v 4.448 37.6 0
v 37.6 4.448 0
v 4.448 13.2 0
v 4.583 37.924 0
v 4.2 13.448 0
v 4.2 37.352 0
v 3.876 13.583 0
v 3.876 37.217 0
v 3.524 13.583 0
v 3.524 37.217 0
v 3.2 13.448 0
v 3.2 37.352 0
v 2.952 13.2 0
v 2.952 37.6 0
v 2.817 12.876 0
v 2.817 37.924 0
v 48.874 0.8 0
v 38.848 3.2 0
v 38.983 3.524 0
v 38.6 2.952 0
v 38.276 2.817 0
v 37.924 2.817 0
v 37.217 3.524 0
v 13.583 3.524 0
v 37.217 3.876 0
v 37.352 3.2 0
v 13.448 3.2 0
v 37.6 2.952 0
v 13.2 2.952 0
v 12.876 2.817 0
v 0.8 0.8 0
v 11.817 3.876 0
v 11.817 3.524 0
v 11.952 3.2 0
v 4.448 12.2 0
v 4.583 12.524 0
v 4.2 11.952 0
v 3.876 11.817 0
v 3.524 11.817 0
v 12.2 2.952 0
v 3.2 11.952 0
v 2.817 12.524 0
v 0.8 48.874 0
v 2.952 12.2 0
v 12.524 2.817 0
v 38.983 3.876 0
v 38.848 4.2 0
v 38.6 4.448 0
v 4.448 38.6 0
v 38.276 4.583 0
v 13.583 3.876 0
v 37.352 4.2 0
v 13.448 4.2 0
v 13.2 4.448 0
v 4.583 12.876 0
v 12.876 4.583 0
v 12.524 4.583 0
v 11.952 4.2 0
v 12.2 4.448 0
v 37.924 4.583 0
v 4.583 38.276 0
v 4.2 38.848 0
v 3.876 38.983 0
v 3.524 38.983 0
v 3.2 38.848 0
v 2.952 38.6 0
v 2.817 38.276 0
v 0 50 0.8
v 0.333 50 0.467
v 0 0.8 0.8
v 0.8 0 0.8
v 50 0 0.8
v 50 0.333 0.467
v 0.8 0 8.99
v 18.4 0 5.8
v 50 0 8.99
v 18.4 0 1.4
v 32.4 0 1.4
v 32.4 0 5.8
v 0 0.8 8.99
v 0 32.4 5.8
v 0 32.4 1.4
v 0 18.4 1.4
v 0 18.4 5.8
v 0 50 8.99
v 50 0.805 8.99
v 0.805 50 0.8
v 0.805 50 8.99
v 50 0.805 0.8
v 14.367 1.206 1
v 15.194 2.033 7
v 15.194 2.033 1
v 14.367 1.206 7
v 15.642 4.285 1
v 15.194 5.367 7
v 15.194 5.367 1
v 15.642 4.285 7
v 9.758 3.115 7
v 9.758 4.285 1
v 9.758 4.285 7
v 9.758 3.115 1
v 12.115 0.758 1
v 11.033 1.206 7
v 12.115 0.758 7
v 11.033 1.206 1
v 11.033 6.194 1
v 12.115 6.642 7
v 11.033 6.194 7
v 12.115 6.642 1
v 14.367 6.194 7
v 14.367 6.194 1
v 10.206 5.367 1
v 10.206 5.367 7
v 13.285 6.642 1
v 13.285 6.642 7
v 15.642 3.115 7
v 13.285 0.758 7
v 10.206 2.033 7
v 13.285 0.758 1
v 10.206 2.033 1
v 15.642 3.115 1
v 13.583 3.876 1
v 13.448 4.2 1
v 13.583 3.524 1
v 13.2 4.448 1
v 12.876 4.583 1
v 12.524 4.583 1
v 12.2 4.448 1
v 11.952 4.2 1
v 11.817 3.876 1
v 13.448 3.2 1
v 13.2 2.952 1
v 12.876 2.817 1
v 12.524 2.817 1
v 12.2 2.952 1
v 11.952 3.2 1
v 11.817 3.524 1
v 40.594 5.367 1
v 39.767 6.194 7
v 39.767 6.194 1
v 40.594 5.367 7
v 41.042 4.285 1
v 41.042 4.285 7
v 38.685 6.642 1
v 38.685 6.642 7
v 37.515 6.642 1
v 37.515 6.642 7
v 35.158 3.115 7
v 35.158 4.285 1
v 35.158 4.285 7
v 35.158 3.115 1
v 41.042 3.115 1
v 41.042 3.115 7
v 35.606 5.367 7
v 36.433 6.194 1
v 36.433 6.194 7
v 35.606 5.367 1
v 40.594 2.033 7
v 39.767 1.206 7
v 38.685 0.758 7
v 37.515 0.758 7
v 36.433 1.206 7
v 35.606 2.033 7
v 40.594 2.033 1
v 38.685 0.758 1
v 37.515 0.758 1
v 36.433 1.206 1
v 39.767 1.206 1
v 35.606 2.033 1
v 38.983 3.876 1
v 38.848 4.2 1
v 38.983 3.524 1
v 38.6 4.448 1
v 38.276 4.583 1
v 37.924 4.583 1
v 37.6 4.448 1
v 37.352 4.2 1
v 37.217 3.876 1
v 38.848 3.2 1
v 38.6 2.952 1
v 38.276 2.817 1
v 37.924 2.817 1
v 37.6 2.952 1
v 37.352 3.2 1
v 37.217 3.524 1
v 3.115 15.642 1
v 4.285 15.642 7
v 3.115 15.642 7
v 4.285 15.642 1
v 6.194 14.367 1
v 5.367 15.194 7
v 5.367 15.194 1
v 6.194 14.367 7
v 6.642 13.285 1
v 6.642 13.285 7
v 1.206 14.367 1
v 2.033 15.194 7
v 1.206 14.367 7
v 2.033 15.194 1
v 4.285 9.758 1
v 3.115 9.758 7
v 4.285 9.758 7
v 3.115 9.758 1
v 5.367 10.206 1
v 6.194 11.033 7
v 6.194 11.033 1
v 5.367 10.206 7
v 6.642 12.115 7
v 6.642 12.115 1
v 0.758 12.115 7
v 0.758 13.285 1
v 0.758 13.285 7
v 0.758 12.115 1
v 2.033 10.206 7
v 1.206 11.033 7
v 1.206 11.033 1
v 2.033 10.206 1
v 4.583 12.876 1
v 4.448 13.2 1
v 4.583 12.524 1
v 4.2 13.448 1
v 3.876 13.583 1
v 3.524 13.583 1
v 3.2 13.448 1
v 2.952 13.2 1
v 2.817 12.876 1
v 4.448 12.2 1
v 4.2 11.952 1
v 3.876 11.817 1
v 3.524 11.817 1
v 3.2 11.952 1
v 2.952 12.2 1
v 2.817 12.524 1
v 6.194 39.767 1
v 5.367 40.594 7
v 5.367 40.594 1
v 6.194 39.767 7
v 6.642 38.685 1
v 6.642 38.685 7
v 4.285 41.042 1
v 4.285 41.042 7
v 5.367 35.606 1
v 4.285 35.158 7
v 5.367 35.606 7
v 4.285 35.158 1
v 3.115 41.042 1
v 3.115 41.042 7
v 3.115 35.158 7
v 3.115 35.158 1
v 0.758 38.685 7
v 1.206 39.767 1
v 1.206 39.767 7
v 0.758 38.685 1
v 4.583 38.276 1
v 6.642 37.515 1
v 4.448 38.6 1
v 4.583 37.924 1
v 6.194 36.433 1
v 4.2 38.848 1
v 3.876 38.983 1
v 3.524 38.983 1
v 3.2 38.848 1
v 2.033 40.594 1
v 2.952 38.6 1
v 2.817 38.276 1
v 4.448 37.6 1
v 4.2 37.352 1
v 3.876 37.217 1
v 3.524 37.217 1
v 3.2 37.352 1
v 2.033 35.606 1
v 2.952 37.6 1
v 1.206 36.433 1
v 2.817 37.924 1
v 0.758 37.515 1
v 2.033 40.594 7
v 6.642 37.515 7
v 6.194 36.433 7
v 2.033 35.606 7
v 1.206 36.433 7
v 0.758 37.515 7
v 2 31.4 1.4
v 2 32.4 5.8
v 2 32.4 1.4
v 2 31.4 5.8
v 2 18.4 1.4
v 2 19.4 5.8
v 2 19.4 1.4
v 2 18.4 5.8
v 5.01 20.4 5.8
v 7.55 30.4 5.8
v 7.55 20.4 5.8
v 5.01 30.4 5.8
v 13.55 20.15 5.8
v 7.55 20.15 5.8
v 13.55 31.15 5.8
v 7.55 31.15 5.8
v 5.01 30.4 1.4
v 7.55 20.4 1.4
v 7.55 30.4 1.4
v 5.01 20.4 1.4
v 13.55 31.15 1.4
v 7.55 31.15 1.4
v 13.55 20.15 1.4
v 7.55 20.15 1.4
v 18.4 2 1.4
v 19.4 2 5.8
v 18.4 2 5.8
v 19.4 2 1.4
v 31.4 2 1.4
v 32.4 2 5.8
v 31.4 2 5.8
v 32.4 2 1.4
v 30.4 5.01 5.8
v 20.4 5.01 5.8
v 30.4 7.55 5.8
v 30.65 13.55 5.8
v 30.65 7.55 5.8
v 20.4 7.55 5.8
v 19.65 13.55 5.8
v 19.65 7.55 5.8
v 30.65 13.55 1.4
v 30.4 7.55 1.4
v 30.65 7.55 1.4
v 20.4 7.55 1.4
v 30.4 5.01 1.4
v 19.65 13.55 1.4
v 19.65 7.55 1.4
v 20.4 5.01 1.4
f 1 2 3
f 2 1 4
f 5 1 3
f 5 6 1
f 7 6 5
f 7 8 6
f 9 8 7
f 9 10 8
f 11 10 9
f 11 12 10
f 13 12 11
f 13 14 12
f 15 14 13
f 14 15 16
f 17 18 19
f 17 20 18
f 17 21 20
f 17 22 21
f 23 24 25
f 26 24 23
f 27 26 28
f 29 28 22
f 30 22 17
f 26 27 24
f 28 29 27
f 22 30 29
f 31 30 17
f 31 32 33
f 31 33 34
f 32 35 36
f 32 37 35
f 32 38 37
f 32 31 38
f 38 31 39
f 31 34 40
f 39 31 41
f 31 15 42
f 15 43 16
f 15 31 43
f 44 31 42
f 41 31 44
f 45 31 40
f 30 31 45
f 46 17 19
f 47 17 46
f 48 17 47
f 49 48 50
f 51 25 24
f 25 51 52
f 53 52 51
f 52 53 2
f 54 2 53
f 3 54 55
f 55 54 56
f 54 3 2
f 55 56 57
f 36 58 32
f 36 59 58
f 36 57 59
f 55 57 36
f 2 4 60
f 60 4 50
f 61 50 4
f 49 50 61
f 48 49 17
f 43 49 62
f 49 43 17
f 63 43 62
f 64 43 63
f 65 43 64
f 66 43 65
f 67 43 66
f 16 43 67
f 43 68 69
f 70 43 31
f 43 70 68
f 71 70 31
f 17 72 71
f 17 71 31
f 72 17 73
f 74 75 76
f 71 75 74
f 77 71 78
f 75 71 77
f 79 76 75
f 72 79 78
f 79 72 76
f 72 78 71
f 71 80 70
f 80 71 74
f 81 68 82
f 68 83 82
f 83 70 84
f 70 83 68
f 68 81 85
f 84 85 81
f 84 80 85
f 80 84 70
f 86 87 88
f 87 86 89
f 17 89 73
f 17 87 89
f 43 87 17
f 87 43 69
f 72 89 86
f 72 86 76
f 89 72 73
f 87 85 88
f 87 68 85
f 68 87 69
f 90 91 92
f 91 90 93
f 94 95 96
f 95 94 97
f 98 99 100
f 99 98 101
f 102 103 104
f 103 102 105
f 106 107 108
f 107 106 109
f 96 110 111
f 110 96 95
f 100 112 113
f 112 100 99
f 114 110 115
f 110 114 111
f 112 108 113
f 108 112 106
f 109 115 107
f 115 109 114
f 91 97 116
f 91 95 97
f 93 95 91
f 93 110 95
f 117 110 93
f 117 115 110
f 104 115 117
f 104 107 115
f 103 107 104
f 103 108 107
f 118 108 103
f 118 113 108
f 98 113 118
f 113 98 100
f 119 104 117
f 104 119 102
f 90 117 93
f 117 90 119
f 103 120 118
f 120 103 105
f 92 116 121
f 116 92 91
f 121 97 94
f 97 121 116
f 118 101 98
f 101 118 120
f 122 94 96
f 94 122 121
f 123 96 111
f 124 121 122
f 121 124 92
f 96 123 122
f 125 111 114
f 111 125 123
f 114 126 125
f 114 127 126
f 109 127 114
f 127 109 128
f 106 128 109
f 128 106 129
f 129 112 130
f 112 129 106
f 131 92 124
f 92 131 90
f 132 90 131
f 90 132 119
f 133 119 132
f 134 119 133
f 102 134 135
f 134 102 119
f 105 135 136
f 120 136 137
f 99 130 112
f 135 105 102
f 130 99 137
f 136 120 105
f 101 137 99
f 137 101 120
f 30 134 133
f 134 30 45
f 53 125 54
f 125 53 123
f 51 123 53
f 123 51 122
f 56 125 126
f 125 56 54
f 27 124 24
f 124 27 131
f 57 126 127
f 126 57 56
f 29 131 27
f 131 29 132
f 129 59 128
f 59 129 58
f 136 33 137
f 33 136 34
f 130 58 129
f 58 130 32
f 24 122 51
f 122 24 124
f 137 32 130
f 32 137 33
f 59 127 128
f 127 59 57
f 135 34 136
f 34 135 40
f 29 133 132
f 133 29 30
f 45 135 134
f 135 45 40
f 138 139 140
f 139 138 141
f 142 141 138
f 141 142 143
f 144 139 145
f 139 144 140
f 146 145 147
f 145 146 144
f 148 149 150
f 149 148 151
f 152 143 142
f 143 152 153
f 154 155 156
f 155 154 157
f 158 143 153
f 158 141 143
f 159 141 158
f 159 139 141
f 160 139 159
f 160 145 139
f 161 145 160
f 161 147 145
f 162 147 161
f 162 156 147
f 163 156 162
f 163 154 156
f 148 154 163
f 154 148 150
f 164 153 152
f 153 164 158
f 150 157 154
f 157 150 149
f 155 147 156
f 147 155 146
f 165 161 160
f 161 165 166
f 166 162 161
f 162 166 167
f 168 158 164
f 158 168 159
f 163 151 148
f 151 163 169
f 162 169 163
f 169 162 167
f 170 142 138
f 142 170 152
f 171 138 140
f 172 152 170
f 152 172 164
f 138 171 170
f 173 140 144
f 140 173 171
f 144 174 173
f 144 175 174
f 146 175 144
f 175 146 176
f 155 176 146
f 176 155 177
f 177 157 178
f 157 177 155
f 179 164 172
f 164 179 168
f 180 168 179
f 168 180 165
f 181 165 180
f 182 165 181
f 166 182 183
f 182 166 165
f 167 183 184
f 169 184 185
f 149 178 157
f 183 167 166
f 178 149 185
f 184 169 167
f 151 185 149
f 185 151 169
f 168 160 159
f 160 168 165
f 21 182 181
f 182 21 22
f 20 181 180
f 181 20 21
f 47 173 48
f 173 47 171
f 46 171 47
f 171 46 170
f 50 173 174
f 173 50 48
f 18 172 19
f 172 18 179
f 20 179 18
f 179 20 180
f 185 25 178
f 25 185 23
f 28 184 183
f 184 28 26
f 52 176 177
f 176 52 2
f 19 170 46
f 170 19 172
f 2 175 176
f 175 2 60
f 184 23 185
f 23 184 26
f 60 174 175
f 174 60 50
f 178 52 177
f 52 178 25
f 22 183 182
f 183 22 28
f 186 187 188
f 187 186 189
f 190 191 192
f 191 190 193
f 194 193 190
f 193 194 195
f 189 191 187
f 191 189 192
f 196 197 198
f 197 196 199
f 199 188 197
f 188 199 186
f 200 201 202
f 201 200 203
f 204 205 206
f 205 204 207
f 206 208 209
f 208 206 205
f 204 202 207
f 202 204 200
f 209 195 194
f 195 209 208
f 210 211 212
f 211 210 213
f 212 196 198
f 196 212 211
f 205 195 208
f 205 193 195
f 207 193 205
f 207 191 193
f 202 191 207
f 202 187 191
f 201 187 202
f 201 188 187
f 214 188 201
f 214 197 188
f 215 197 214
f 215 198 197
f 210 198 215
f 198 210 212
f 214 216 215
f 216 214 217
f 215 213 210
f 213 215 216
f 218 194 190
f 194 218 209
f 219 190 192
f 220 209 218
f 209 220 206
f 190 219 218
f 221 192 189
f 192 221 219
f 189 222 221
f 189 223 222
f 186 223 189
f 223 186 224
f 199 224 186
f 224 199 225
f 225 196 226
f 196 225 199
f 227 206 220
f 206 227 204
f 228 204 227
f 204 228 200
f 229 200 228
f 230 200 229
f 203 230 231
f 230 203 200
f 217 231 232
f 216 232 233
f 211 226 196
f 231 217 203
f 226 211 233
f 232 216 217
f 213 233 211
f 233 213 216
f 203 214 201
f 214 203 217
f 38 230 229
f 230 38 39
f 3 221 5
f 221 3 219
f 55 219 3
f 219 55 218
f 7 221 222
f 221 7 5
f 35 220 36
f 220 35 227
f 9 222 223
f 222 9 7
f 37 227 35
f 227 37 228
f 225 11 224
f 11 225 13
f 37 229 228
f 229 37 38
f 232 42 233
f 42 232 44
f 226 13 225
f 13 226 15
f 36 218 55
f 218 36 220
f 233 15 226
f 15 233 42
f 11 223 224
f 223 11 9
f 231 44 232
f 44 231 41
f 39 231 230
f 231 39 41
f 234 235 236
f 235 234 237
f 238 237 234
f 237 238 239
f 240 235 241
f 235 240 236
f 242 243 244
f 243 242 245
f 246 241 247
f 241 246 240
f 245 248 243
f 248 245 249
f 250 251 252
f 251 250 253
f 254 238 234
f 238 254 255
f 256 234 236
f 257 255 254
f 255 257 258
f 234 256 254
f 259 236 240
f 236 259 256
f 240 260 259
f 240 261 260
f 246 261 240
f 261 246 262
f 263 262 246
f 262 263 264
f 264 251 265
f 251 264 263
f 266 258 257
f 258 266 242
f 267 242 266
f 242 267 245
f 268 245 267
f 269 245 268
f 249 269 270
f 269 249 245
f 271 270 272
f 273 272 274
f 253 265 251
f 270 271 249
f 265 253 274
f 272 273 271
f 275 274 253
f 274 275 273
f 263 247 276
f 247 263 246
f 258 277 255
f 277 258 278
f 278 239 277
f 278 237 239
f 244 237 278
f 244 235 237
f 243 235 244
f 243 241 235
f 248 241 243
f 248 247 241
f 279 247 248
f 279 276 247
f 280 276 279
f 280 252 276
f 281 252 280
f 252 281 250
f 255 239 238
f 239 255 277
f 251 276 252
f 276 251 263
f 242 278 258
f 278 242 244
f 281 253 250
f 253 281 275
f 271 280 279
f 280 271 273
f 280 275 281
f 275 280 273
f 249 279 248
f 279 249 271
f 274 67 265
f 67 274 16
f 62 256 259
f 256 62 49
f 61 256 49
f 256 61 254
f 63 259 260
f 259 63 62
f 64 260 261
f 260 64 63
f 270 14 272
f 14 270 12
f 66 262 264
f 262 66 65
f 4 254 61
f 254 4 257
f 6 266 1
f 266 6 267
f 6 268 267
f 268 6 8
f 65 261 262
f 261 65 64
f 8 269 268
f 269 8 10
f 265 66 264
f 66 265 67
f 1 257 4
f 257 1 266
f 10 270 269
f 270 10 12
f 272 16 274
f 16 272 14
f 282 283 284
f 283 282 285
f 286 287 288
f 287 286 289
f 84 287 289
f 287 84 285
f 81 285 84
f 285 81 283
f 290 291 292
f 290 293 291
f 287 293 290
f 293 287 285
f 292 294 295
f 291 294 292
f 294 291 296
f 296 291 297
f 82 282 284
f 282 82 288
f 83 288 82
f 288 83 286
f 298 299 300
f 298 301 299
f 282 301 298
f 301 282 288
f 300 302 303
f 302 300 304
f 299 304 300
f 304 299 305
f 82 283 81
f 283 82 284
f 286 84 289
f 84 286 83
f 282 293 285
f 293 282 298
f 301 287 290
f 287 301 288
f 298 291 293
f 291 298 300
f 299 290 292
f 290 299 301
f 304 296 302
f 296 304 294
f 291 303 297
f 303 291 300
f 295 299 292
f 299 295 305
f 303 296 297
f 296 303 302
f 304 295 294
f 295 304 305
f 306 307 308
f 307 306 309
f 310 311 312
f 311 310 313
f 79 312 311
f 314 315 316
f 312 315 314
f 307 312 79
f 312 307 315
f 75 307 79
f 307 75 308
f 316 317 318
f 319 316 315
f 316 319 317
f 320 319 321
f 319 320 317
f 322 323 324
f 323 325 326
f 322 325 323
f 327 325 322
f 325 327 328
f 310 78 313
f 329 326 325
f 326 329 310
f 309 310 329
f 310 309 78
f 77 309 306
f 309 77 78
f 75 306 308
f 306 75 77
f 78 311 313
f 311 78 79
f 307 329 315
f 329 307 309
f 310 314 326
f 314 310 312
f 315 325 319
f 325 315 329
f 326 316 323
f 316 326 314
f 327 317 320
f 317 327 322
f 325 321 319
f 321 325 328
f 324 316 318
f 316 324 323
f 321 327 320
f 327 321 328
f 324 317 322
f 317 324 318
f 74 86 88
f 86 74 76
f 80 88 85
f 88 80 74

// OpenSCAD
// file: floor_01_solid.scad
include <libs.scad>;

//floor
*round(2);
diagonal(2,2);
*square(2,2);

//import("AS_full.stl");


module square(xsize,ysize)
{
  difference()
  {
    floor_plate(xsize,ysize);
    grids(xsize,ysize);
  }
}
module diagonal(xsize,ysize)
{
  intersection()
  {
    difference()
    {
      floor_plate(xsize,ysize);
      grids(xsize,ysize);
    }
    translate([0,0,floor_thick/2])hull()
    {
      //we want a slanted portion, so we'll hull two thin slivers that reach to the length
      cube([2*xsize*basis-bevel*2*sqrt(2),ep,floor_thick],center=true);
      cube([2*xsize*basis,ep,floor_thick-bevel*2],center=true);
      cube([ep,2*ysize*basis-bevel*2*sqrt(2),floor_thick],center=true);
      cube([ep,2*ysize*basis,floor_thick-bevel*2],center=true);
    }
    translate([0,0,floor_thick/2])cube([xsize*2*basis-bevel*2,ysize*2*basis-bevel*2,floor_thick],center=true);
  }
}
module round(radius)
{
  intersection()
  {
    difference()
    {
      floor_plate(radius,radius);
      grids(radius,radius);
    }
    hull()
    {
      translate([0,0,bevel])cylinder(r=radius*basis,h=floor_thick-bevel*2,$fn=200);
      cylinder(r=radius*basis-bevel,h=floor_thick,$fn=200);
    }
  }
}
// main file
include <libs.scad>;
use <floor_01_solid.scad>;

//floor
*round_final(2);
*square_final(2,2);
diagonal_final(2,2);

module square_final(xsize,ysize)
{
  intersection()
  {
    import("finalized_stl/floor_square_2x2_b.stl");
    translate([0,0,floor_thick-ep])cube([xsize*3*basis,ysize*3*basis,floor_depth*2],center=true);
  }

  intersection()
  {
    cube([xsize*3*basis,ysize*3*basis,2*(floor_thick-floor_depth-ep)],center=true);
    difference()
    {
      square(xsize,ysize);
      square_mag_holes(xsize,ysize);
      square_openlocks(xsize,ysize);
    }
  }
}
module diagonal_final(xsize,ysize)
{
  intersection()
  {
    cube([xsize*3*basis,ysize*3*basis,2*(floor_thick-floor_depth-ep)],center=true);
    difference()
    {
      diagonal(xsize,ysize);
      square_mag_holes(xsize,ysize);
      square_openlocks(xsize,ysize);
    }
  }
}
module round_final(radius)
{
  intersection()
  {
    import("floor_02_round_solid_chipped_d.stl");
    translate([0,0,floor_thick-ep])cube([radius*3*basis,radius*3*basis,floor_depth*2],center=true);
  }

  intersection()
  {
    cube([radius*3*basis,radius*3*basis,2*(floor_thick-floor_depth-ep)],center=true);
    difference()
    {
      round(radius);
      round_mag_holes(radius);
      round_openlocks(radius);
    }
  }
}
